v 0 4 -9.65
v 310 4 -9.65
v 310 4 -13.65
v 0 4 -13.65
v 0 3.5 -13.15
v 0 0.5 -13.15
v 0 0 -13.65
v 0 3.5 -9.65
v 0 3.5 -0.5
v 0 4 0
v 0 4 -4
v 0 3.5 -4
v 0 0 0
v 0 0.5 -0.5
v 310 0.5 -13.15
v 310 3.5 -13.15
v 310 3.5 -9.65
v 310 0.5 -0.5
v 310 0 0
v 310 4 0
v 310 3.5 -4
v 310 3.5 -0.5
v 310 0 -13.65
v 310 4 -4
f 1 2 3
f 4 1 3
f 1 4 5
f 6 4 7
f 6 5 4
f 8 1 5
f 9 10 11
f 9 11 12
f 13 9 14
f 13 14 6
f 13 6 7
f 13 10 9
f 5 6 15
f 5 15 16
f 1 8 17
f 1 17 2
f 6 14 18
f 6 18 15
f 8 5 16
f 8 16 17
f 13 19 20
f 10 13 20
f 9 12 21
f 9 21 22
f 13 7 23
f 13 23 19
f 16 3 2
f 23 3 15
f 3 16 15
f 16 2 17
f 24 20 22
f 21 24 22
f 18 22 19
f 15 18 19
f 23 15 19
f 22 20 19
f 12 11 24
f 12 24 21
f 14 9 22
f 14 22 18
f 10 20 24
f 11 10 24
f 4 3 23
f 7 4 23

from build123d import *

# Parameters (mm, degrees)
Y_KSEKLIK_EKSTR_ZYON1_DEPTH = 310


with BuildPart() as part:
    # Çizim1 → Yükseklik-Ekstrüzyon1 (new body)
    with BuildSketch(Plane(origin=(0, 0, 0), x_dir=(0, -1, 0), z_dir=(-1, 0, 0))):
        Polygon((0, 0), (-4, 0), (-4, -4), (-3.5, -4), (-3.5, -0.5), (-0.5, -0.5), (-0.5, -13.15), (-3.5, -13.15), (-3.5, -9.65), (-4, -9.65), (-4, -13.65), (0, -13.65), align=None)
    extrude(amount=-Y_KSEKLIK_EKSTR_ZYON1_DEPTH)


solid = part.part
